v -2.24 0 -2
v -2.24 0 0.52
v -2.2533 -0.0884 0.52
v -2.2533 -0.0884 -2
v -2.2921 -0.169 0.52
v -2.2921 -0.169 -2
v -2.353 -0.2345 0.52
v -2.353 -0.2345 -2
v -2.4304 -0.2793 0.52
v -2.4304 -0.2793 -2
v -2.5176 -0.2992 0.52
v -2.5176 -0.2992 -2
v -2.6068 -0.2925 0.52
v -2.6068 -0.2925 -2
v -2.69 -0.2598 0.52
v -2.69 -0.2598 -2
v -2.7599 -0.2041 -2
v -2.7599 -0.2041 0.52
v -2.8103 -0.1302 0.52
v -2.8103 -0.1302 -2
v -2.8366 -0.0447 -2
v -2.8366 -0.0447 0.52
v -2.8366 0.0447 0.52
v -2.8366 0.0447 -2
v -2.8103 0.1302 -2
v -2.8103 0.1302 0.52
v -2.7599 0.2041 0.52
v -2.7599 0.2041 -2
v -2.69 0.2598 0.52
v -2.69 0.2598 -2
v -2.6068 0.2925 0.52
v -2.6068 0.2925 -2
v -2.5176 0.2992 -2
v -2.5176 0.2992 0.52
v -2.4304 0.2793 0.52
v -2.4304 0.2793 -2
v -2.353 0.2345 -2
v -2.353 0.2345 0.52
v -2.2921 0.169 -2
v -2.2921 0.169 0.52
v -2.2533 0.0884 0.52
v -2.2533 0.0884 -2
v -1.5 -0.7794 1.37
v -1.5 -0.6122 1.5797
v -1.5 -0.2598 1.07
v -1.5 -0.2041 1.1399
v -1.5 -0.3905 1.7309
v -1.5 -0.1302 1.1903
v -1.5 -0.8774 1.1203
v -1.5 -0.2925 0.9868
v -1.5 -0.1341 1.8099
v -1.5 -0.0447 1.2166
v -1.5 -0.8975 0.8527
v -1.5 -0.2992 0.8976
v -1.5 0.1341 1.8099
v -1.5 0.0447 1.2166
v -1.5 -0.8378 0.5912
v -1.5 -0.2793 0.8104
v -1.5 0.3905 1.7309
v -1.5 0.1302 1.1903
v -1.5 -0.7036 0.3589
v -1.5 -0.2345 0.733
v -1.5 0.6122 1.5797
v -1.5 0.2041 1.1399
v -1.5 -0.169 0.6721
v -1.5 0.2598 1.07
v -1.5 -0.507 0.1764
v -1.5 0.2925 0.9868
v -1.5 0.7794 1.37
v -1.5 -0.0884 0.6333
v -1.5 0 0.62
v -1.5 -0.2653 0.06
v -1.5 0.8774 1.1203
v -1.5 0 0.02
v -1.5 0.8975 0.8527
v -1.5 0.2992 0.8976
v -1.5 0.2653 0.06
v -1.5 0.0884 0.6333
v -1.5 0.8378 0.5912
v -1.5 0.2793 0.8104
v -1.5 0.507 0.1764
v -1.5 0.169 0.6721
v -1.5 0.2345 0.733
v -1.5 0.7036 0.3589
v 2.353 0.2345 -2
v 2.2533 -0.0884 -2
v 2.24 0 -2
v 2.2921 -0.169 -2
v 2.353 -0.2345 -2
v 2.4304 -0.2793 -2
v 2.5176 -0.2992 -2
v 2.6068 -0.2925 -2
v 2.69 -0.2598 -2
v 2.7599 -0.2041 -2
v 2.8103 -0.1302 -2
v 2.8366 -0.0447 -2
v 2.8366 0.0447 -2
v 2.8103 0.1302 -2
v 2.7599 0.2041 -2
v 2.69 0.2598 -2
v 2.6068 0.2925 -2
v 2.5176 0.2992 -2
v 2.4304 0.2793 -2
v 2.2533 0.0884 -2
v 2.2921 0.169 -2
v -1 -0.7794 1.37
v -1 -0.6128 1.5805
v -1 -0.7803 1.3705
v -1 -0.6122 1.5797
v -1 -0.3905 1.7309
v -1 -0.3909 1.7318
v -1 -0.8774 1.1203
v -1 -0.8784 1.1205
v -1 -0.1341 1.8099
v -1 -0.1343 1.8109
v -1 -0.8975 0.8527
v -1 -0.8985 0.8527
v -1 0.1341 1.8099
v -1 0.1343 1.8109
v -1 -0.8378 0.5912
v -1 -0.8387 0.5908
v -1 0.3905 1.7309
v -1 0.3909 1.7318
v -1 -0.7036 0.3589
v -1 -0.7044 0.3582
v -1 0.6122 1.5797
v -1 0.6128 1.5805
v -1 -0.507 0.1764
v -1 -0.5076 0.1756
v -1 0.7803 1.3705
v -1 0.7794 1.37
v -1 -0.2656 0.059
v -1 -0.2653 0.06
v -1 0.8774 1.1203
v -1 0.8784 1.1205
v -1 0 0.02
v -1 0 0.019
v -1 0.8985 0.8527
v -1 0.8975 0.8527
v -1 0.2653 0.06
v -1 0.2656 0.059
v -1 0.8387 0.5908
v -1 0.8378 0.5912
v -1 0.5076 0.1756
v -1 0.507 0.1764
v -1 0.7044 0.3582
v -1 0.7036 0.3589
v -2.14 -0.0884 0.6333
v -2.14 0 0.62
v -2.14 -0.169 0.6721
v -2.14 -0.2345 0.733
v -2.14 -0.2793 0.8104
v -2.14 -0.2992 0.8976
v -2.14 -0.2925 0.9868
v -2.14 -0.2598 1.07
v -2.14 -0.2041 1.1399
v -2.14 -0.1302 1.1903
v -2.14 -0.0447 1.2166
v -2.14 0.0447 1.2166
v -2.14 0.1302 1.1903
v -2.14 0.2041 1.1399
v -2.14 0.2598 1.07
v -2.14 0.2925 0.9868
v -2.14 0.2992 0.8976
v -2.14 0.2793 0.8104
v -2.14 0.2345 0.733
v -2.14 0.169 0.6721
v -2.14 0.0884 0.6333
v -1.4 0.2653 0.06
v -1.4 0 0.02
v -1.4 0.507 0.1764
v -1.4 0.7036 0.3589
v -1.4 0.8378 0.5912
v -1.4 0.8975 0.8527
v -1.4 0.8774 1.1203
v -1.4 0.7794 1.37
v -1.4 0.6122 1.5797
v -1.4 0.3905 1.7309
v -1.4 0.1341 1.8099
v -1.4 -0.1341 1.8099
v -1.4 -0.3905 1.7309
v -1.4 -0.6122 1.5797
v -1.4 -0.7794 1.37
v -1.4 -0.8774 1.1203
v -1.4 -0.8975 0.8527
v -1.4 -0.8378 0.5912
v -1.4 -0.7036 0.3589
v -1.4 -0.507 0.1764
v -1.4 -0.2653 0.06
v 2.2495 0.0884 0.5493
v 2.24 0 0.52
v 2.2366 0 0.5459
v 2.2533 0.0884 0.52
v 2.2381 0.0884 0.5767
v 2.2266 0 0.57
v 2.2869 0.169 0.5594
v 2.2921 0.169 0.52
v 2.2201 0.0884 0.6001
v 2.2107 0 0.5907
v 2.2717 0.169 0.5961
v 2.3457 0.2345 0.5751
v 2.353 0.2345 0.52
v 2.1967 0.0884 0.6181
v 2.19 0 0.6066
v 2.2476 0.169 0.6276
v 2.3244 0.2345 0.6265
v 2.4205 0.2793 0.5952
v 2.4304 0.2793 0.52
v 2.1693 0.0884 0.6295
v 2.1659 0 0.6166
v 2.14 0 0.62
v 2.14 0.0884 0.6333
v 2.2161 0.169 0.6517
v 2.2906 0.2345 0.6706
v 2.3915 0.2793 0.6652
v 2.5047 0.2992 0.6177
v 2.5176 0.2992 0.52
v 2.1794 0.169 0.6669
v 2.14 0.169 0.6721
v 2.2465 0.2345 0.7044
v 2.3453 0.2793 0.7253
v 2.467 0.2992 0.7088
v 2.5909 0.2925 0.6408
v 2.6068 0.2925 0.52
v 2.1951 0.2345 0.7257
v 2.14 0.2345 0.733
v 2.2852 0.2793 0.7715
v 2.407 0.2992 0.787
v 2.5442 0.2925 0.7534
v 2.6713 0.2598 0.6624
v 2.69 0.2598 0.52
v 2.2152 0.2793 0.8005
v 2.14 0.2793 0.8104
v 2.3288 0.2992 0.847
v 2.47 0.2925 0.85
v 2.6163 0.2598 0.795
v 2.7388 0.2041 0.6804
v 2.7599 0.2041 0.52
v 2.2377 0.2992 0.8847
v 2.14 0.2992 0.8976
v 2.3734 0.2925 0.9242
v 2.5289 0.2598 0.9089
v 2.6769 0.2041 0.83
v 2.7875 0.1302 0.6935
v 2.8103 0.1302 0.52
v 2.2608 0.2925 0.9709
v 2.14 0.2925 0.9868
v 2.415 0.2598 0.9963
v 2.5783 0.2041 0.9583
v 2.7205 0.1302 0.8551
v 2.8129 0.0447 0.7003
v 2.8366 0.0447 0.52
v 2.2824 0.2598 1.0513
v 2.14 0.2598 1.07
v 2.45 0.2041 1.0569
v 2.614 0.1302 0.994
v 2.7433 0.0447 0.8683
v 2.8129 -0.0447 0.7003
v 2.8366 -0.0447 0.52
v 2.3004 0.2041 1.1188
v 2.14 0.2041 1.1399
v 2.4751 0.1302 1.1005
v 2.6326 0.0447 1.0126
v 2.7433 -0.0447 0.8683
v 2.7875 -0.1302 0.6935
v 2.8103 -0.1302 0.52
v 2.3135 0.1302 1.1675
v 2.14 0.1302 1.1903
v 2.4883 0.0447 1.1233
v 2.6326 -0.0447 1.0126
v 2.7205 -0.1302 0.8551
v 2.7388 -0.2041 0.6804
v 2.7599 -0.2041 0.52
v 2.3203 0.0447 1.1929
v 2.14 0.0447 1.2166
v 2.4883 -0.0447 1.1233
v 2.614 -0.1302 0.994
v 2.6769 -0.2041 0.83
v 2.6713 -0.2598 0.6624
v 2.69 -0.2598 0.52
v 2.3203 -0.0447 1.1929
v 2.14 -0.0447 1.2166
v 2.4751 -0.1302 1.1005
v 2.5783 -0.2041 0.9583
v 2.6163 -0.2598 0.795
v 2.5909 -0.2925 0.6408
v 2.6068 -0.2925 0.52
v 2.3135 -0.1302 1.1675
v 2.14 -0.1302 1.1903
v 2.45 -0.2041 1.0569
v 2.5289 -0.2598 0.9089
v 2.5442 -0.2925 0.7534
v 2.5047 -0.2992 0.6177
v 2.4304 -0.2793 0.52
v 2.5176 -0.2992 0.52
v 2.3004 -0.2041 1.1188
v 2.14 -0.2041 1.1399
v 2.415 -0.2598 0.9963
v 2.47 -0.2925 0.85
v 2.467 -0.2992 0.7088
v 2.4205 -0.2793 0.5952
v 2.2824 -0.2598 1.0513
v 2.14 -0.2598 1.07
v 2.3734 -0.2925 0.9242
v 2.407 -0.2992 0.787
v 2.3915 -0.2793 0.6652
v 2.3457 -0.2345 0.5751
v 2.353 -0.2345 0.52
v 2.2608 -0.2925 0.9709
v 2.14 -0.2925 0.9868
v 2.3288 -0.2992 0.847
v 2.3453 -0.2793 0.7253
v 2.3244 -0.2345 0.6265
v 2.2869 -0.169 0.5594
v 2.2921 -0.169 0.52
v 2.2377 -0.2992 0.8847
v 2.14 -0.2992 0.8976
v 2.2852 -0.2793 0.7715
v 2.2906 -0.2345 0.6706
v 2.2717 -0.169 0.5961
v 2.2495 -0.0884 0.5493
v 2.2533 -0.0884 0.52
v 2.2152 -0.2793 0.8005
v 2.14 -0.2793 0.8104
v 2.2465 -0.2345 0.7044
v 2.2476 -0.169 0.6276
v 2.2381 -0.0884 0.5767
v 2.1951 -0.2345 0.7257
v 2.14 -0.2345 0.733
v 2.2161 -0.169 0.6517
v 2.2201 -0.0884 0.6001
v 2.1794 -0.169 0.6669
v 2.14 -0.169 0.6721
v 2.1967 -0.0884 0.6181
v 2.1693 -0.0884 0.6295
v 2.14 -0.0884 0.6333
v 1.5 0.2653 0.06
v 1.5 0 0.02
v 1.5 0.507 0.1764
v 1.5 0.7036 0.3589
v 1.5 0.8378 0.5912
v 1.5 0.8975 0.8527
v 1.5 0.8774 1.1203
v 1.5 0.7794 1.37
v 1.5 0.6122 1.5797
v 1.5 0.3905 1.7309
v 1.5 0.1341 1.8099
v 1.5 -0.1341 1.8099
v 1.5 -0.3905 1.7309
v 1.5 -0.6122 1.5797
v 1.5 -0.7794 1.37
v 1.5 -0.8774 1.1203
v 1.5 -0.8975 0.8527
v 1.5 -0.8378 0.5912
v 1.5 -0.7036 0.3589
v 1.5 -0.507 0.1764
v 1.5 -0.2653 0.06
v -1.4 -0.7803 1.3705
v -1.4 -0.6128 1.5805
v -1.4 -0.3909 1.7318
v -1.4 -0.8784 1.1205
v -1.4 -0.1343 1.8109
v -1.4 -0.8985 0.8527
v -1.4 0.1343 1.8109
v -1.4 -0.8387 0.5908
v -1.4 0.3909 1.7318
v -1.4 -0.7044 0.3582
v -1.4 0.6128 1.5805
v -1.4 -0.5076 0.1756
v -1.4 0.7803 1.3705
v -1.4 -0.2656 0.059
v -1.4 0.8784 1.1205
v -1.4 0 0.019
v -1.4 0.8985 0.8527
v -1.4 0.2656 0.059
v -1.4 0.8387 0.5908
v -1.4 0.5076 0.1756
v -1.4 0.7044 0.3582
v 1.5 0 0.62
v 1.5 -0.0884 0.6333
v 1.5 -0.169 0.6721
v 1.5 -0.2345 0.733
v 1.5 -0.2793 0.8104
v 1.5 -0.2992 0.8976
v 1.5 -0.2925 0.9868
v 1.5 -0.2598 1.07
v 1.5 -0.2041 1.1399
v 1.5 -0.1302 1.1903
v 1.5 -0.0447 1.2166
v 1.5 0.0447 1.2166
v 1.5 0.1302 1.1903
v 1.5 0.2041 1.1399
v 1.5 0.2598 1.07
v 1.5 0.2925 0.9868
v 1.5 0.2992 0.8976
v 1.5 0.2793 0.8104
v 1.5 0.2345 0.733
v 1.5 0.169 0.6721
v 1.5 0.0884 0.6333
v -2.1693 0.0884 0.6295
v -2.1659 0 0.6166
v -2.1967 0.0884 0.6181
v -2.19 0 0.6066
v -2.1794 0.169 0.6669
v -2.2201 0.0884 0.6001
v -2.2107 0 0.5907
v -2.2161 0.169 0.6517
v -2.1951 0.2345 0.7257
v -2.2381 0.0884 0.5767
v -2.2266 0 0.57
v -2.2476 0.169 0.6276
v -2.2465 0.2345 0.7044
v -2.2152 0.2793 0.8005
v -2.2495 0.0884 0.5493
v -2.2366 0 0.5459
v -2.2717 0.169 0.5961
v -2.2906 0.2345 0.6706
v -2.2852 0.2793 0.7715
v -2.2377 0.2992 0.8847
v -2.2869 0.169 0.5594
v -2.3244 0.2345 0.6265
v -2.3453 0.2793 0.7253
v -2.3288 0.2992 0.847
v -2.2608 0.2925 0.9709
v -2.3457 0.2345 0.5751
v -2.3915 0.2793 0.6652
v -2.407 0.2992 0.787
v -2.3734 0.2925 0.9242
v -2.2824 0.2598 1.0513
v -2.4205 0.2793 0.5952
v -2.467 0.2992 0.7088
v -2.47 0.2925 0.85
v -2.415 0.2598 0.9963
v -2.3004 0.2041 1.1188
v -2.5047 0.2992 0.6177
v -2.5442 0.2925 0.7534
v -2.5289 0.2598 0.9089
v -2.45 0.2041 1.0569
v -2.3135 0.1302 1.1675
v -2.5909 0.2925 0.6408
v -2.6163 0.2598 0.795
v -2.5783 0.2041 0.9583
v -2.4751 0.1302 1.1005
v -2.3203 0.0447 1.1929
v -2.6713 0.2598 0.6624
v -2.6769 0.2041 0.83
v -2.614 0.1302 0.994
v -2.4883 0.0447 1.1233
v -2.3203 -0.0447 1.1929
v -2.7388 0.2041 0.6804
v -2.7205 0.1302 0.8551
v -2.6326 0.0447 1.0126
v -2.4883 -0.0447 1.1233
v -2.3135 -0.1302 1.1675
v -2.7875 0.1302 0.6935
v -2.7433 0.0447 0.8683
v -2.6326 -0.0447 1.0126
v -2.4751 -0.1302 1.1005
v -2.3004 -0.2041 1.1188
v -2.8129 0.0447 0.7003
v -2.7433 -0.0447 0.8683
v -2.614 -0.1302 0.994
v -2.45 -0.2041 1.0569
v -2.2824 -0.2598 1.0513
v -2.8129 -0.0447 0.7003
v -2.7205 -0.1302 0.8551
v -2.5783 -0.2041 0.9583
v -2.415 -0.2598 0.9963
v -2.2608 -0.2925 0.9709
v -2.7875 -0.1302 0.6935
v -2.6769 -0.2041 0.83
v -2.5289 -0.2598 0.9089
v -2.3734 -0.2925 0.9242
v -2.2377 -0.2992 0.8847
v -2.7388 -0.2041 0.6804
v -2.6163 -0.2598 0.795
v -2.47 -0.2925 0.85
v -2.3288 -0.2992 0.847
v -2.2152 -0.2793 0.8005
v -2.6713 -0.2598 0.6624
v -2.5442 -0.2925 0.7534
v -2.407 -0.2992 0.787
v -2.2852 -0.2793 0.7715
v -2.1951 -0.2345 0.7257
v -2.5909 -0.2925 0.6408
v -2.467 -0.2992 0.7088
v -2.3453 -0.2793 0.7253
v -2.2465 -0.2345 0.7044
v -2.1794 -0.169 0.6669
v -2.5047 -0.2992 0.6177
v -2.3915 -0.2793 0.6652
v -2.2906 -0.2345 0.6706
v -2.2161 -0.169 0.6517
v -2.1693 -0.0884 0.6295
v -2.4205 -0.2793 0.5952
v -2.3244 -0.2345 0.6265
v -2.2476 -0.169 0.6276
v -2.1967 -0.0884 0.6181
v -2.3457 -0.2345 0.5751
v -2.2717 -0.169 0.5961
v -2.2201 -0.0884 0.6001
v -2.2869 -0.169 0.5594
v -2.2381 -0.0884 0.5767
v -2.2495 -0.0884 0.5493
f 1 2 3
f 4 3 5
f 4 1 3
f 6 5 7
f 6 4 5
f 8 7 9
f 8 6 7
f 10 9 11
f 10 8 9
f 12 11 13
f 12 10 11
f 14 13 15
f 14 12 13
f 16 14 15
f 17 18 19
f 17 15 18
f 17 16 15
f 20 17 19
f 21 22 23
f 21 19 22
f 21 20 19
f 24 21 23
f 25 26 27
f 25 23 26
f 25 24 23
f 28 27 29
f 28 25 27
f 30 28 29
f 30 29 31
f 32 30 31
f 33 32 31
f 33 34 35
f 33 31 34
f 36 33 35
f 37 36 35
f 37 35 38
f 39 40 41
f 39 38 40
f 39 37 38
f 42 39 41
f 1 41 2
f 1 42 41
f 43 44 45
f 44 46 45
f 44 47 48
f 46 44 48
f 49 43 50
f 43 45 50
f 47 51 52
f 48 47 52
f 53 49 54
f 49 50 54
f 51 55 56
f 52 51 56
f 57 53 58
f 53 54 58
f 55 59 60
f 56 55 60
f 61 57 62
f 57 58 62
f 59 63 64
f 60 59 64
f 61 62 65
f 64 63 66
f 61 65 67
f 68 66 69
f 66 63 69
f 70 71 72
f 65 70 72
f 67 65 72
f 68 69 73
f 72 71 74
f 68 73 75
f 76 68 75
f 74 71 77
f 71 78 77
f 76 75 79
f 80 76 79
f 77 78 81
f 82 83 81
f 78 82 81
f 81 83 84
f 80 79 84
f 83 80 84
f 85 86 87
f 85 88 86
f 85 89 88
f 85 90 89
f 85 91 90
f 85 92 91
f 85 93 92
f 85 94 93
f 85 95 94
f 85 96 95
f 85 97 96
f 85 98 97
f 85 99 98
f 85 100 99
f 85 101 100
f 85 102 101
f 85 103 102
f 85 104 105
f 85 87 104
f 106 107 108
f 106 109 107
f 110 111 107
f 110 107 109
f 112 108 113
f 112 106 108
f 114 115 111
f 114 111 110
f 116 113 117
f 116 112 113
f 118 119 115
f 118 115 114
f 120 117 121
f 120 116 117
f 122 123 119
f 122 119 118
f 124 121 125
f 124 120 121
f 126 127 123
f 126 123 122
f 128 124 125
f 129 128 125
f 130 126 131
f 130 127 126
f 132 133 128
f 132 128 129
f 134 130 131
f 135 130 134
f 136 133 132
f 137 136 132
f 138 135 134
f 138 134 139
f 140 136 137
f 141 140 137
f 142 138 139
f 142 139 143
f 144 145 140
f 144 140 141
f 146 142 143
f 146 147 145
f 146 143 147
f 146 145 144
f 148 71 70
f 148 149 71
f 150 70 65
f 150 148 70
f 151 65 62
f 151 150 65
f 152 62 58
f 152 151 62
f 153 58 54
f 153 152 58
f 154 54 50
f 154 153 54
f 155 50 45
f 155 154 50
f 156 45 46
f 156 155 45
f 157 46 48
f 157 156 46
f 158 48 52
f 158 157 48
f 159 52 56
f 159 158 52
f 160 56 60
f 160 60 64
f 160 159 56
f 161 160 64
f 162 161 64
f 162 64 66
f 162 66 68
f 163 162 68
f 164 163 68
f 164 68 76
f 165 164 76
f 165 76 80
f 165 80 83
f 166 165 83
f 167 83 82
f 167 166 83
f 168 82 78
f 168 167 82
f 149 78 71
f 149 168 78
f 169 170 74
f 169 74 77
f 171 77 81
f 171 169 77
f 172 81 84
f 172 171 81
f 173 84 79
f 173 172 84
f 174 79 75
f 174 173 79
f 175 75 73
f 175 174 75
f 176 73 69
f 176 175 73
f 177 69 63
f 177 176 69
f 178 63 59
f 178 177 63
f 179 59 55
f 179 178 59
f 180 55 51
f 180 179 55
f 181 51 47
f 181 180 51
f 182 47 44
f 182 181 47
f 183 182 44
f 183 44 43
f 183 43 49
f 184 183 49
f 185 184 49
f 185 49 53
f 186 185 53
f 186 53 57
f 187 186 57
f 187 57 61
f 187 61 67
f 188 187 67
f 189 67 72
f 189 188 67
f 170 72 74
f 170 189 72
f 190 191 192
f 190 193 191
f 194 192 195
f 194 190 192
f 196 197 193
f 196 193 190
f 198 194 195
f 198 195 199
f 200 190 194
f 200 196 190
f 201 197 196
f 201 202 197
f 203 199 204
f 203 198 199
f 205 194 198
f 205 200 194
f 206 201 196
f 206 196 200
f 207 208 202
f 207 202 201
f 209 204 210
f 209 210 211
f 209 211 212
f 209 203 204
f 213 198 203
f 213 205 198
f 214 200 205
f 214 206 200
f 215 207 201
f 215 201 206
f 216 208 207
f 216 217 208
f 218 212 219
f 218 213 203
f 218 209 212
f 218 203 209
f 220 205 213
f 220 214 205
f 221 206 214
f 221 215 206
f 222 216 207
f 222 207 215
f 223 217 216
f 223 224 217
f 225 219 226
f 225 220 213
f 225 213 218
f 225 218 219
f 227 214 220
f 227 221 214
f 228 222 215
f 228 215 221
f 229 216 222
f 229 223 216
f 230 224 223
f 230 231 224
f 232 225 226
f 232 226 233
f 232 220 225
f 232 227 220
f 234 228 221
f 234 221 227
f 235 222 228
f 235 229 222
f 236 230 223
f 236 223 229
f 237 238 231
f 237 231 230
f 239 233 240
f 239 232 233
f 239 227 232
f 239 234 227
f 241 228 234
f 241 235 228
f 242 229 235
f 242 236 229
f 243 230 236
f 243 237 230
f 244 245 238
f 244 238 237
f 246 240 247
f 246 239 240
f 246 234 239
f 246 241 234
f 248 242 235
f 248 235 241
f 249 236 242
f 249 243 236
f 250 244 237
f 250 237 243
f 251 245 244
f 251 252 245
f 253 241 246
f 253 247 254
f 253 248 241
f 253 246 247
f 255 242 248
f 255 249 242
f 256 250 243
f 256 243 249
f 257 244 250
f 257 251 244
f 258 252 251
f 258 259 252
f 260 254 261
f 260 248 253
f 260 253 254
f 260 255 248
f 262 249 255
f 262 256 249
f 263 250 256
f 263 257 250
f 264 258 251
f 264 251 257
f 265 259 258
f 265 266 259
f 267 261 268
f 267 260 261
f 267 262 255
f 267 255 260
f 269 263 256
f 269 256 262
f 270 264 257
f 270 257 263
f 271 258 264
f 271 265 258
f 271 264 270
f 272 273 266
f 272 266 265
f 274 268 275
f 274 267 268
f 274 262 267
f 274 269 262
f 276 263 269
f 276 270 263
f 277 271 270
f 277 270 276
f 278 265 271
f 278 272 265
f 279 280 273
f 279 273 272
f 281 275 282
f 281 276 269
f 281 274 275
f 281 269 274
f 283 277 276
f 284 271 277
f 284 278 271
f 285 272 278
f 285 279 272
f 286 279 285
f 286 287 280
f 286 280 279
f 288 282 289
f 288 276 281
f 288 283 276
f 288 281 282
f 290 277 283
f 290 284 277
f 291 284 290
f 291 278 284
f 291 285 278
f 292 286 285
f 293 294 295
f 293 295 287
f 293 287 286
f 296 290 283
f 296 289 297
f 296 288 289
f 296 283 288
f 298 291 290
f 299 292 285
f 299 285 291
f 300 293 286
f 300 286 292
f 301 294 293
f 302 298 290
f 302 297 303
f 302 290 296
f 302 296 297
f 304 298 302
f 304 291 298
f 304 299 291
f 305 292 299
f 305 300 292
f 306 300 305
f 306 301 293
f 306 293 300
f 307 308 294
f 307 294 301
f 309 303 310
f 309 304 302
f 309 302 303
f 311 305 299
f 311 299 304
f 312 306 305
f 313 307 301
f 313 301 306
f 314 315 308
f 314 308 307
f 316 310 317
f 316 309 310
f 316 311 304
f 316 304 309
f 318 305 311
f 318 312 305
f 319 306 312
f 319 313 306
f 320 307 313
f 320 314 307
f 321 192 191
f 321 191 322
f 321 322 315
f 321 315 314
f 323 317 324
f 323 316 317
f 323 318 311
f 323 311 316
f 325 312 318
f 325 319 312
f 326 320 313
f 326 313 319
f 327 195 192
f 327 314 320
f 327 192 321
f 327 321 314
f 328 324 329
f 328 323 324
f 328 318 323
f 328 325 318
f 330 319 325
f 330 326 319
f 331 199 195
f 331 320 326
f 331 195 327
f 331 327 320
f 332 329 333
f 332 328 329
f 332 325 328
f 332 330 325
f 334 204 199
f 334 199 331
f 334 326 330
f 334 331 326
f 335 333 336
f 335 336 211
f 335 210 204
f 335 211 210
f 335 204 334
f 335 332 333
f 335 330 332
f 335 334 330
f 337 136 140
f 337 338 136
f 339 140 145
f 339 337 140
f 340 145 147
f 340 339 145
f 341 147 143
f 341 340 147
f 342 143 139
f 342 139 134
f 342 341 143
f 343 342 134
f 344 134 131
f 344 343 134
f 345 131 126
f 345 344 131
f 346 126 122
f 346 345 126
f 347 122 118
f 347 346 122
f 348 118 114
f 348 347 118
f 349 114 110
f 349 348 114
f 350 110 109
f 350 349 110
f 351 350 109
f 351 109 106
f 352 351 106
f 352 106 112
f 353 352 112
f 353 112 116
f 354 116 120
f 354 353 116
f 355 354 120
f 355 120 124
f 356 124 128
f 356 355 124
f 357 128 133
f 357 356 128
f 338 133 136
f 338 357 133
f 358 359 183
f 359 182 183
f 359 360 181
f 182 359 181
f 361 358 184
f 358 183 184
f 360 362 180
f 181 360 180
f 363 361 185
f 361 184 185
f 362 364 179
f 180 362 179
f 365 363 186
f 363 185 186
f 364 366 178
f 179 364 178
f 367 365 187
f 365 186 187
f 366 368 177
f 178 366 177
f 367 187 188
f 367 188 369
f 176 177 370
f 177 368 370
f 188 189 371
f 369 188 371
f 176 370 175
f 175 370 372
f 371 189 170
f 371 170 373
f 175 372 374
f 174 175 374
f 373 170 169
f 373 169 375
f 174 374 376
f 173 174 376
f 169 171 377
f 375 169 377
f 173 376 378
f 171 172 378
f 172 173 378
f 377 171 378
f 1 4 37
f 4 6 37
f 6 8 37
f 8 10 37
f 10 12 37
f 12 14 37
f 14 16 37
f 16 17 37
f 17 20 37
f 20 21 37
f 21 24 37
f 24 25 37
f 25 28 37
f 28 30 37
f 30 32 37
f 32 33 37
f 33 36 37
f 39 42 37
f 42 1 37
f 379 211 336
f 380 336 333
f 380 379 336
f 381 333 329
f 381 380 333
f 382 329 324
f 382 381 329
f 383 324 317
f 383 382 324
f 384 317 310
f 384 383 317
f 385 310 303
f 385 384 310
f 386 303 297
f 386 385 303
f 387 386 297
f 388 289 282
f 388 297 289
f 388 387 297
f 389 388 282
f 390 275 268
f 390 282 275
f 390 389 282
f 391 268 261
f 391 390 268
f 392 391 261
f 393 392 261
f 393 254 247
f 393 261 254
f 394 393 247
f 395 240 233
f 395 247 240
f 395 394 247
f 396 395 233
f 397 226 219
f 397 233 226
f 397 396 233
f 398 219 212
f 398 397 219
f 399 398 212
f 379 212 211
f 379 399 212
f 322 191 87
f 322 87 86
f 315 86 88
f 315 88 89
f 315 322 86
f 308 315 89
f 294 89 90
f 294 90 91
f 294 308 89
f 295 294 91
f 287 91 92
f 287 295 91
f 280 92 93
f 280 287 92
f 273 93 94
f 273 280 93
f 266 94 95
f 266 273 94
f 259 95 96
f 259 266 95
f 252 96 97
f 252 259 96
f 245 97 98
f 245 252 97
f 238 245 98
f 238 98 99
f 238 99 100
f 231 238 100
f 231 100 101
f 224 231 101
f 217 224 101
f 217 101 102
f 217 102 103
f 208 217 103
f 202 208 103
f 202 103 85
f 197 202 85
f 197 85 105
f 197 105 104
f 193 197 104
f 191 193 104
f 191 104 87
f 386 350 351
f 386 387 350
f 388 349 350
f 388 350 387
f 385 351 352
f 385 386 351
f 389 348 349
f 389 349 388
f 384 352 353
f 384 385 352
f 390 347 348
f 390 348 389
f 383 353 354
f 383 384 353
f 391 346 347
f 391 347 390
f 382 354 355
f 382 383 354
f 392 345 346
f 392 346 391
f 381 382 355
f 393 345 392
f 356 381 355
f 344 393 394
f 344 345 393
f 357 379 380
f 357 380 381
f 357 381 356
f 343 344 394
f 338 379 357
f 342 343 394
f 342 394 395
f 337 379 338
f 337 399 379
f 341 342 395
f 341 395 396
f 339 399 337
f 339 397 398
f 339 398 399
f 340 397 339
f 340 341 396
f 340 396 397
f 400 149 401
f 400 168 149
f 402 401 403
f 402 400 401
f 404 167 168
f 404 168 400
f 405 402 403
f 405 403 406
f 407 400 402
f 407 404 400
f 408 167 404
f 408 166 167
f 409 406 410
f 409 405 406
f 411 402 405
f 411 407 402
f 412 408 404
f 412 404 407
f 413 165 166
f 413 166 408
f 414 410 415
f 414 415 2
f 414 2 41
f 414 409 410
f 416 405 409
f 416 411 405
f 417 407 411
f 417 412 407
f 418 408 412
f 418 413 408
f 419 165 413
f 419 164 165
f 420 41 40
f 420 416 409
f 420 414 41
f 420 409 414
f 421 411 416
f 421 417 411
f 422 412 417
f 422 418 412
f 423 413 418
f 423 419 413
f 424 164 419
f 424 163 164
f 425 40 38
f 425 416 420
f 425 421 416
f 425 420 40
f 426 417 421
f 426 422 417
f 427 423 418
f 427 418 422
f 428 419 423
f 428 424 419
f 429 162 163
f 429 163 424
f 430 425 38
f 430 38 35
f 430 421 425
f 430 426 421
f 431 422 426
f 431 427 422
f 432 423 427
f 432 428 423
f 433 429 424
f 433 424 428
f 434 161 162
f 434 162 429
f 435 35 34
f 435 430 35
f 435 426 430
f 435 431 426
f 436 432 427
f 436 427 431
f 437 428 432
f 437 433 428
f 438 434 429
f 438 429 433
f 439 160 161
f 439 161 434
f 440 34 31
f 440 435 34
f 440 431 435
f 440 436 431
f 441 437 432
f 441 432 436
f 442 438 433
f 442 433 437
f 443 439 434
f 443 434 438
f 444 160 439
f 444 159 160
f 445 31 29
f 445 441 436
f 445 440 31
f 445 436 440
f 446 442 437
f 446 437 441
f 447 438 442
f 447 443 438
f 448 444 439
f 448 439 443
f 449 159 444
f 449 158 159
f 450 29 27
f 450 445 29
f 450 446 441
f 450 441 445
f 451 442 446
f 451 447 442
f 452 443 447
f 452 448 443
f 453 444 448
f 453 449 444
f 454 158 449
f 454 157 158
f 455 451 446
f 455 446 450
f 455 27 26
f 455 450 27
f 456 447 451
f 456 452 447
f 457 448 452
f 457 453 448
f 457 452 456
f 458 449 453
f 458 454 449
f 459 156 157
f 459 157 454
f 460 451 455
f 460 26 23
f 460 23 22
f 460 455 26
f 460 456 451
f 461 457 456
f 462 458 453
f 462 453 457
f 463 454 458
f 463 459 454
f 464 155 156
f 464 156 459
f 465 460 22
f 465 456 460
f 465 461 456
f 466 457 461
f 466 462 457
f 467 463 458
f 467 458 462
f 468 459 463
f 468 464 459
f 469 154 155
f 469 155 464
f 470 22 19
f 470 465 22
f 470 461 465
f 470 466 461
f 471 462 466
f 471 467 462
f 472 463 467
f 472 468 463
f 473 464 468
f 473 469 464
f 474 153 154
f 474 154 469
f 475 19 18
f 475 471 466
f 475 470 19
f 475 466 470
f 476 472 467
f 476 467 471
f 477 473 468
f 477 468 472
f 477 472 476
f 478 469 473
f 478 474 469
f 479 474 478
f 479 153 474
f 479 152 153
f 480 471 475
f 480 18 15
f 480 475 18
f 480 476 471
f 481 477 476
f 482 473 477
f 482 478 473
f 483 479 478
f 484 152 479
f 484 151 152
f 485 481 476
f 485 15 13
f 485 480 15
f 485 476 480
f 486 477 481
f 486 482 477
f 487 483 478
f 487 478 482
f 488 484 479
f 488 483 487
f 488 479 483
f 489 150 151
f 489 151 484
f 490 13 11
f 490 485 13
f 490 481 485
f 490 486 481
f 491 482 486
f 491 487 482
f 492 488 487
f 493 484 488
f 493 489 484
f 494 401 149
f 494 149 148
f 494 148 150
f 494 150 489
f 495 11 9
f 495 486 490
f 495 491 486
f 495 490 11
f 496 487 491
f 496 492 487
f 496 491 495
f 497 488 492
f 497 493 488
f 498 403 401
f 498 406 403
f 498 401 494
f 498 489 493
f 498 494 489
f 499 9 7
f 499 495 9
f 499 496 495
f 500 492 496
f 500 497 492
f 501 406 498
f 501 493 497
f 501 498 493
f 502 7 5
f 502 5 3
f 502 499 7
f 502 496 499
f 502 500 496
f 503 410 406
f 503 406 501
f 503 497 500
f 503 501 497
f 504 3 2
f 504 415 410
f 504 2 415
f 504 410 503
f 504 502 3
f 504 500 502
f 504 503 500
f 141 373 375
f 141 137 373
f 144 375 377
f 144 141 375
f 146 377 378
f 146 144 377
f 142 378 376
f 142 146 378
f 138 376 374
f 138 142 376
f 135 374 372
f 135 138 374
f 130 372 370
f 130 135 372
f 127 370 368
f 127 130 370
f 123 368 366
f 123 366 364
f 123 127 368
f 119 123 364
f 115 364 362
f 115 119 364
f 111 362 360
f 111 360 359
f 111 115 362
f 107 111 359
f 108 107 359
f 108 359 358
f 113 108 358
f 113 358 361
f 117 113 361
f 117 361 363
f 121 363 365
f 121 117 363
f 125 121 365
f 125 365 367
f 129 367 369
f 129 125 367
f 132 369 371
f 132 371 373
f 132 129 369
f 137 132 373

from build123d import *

# Parameters (mm, degrees)
IZIM2_R                     = 0.3
IZIM4_R                     = 0.9
Y_KSEKLIK_EKSTR_ZYON3_DEPTH = 1.5
EKSTR_ZYON_NCE1_START       = -1.2
IZIM4_5_R                   = 0.901
IZIM4_5_R_2                 = 0.9
EKSTR_ZYON_NCE1_DEPTH       = 0.2


with BuildPart() as part:
    # Süpür2: sweep along a path in Çizim3
    with BuildLine(Plane(origin=(0, 0, 0), x_dir=(1, 0, 0), z_dir=(0, 1, 0))) as s_p_r2_path:
        Line((2.54, 2), (2.54, -0.52))
        ThreePointArc((2.54, -0.52), (2.422842712, -0.802842712), (2.14, -0.92))
        Line((2.14, -0.92), (-2.14, -0.92))
        ThreePointArc((-2.14, -0.92), (-2.422842712, -0.802842712), (-2.54, -0.52))
        Line((-2.54, -0.52), (-2.54, 2))
    # Çizim2 → Süpür2 (sweep)
    with BuildSketch(Plane(origin=(0, 0, -2), x_dir=(-1, 0, 0), z_dir=(0, 0, -1))):
        with Locations((-2.54, 0)):
            Circle(IZIM2_R)
    sweep(path=s_p_r2_path.line)

    # Çizim4 → Yükseklik-Ekstrüzyon3 (add, symmetric)
    with BuildSketch(Plane(origin=(0, 0, 0), x_dir=(0, 0, -1), z_dir=(1, 0, 0))):
        with Locations((-0.92, 0)):
            Circle(IZIM4_R)
    extrude(amount=Y_KSEKLIK_EKSTR_ZYON3_DEPTH, both=True)

    # Çizim4<5> → Ekstrüzyon-İnce1 (add, symmetric)
    with BuildSketch(Plane(origin=(0, 0, 0), x_dir=(0, 0, -1), z_dir=(1, 0, 0)).offset(EKSTR_ZYON_NCE1_START)):
        with Locations((-0.92, 0)):
            Circle(IZIM4_5_R)
        with Locations((-0.92, 0)):
            Circle(IZIM4_5_R_2, mode=Mode.SUBTRACT)
    extrude(amount=EKSTR_ZYON_NCE1_DEPTH, both=True)


solid = part.part
